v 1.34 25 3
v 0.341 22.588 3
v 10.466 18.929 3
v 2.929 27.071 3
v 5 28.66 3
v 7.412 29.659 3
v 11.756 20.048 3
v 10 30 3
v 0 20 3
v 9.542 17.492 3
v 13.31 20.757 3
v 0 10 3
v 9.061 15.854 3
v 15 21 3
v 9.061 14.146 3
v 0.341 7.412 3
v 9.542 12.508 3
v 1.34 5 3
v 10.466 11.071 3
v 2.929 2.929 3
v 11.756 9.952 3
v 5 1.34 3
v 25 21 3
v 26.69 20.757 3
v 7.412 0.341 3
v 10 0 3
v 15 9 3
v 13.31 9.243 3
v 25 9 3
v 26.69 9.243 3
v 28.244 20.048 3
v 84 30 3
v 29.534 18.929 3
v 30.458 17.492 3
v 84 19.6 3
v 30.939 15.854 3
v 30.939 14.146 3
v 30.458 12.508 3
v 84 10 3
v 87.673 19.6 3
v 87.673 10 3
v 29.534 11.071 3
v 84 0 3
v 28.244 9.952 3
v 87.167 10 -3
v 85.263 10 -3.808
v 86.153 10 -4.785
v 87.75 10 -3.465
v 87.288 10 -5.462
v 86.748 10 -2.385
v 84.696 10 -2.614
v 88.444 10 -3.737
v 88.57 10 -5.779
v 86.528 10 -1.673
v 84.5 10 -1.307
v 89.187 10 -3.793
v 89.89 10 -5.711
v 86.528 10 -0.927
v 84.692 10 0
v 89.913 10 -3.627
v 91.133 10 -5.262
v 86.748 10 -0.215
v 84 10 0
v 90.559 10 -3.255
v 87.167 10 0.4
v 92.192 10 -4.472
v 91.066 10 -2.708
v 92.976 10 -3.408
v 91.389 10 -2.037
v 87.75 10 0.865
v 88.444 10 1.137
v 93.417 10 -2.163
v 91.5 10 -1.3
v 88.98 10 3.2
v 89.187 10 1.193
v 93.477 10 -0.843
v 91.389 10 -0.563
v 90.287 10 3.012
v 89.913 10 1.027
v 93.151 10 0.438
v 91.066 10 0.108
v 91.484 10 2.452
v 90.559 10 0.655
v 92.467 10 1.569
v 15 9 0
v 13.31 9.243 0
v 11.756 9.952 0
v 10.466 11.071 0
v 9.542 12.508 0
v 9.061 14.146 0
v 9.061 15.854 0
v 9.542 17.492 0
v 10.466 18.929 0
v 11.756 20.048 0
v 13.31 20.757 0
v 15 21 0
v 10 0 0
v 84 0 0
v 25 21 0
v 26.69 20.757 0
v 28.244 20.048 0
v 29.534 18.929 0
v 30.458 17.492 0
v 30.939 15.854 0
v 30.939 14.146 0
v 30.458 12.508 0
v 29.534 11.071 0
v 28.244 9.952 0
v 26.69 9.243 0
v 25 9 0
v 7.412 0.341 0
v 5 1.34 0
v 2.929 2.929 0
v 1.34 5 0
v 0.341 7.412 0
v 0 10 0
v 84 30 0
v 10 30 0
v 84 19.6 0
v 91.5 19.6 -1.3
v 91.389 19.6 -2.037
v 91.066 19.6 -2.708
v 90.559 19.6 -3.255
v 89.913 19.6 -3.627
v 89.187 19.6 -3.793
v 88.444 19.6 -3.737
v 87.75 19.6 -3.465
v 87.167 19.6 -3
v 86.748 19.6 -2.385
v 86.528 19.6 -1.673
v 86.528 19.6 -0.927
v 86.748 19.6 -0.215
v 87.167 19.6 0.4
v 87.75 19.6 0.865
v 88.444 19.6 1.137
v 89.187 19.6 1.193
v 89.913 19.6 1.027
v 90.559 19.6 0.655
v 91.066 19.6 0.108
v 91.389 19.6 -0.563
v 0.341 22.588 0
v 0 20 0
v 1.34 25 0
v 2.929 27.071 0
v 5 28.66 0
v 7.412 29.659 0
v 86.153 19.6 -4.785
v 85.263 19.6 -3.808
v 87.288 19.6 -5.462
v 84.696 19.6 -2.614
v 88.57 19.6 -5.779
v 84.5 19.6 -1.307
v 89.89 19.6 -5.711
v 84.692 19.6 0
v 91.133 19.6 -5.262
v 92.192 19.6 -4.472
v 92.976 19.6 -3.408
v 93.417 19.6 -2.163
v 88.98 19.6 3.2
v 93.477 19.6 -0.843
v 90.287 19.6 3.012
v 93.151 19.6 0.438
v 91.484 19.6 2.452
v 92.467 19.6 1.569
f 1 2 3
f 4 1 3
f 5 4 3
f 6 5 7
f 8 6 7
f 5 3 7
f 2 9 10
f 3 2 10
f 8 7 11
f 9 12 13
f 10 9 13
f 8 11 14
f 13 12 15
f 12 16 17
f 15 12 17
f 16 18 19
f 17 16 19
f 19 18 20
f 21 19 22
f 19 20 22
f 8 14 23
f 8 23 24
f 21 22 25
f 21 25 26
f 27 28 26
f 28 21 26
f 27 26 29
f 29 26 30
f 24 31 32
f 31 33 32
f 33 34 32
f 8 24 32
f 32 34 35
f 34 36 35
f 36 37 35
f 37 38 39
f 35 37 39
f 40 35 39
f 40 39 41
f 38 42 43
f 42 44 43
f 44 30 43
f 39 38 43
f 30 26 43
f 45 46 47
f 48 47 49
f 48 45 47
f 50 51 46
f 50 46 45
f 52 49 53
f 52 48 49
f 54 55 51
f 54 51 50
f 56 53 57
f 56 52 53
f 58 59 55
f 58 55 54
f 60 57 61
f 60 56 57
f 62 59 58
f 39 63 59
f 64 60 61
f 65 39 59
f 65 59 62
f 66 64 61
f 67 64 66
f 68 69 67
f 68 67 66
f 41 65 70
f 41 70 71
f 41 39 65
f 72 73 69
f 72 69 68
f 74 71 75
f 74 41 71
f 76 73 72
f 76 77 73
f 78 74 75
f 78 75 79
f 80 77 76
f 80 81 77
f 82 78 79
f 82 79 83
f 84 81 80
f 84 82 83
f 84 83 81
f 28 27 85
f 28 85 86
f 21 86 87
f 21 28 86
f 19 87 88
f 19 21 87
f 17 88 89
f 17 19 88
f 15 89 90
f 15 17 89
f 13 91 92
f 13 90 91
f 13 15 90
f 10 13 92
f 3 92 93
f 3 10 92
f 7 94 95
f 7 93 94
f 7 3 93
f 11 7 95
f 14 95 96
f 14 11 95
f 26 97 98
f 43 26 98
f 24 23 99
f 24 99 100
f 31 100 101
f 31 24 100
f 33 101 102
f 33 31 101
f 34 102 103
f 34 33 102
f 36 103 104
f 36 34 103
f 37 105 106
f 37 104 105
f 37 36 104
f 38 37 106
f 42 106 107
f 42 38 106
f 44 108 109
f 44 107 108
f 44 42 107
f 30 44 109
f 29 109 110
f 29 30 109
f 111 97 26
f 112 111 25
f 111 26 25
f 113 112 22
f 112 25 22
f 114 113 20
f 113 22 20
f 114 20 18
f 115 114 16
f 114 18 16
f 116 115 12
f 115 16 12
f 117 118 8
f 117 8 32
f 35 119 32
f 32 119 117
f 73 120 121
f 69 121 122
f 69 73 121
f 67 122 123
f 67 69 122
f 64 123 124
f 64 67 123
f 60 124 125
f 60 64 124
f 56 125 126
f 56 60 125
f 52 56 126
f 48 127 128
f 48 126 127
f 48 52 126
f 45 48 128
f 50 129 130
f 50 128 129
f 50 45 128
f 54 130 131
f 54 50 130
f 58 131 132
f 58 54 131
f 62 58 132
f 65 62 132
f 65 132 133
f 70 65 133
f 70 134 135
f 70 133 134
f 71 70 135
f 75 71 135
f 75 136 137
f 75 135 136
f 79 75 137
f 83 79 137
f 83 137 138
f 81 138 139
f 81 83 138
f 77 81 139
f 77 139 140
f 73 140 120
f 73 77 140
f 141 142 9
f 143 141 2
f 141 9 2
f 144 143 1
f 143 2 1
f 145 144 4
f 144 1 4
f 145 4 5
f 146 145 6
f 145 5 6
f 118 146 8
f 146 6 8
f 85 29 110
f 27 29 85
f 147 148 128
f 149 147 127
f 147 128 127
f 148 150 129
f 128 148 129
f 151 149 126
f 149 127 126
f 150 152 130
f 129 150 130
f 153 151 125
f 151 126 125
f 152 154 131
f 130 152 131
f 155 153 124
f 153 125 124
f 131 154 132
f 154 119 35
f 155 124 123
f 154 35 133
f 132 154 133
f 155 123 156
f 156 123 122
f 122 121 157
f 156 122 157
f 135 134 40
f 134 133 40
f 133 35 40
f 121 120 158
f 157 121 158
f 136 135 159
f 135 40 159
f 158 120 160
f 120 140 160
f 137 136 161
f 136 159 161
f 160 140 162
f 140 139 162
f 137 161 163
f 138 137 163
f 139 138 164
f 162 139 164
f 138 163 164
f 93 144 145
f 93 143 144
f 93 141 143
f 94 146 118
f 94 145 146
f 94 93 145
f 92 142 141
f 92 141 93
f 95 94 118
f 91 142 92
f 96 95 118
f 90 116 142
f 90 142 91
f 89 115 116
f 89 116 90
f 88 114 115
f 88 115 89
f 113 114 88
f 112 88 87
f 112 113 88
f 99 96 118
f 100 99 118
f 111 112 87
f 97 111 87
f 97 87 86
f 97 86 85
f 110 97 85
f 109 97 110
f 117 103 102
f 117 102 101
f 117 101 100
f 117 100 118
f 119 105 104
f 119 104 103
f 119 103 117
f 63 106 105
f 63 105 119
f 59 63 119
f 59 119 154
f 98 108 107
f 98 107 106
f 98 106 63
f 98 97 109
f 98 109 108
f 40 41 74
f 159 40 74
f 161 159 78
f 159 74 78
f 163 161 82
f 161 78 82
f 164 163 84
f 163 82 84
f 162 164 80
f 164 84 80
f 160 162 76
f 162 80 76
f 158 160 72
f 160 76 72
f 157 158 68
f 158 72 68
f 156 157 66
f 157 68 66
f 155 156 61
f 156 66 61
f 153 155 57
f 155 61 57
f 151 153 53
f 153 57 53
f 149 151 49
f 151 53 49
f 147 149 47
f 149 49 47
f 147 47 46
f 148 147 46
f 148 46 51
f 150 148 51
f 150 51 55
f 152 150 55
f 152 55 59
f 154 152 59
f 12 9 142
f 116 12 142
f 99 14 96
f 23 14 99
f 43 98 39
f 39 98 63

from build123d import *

# Parameters (mm, degrees)
SKETCH_1_W               = 88
SKETCH_1_H               = 3
EXTRUDE_1_DEPTH          = 30
SKETCH_2_R               = 4.5
EXTRUDE_1_2_DEPTH        = 30
SKETCH_3_R               = 2.5
CUT_EXTRUDE_1_DEPTH      = 31
SKETCH_4_W               = 11
SKETCH_4_H               = 10.4
SKETCH_4_H_2             = 10
CUT_EXTRUDE_2_DEPTH      = 4.2
CUT_EXTRUDE_2_DEPTH_BACK = 6.8
CUT_EXTRUDE_3_DEPTH      = 9.8


with BuildPart() as part:
    # Эскиз1 → Extrude 1 (new body)
    with BuildSketch(Plane(origin=(0, 0, 0), x_dir=(1, 0, 0), z_dir=(0, 1, 0))):
        with Locations((44, -1.5)):
            Rectangle(SKETCH_1_W, SKETCH_1_H)
    extrude(amount=EXTRUDE_1_DEPTH)

    # Эскиз2 → Extrude 1 2 (add)
    with BuildSketch(Plane(origin=(0, 0, 0), x_dir=(1, 0, 0), z_dir=(0, 1, 0))):
        with Locations((89, 1.3)):
            Circle(SKETCH_2_R)
    extrude(amount=EXTRUDE_1_2_DEPTH)

    # Эскиз3 → Вырез-Вытянуть1 (cut, through all)
    with BuildSketch(Plane(origin=(0, 0, 0), x_dir=(1, 0, 0), z_dir=(0, 1, 0))):
        with Locations((89, 1.3)):
            Circle(SKETCH_3_R)
    extrude(amount=CUT_EXTRUDE_1_DEPTH, mode=Mode.SUBTRACT)

    # Эскиз4 → Вырез-Вытянуть2 (cut, two sides)
    with BuildSketch(Plane.XY) as cut_extrude_2_sk:
        with Locations((89.5, 24.8)):
            Rectangle(SKETCH_4_W, SKETCH_4_H)
        with Locations((89.5, 5)):
            Rectangle(SKETCH_4_W, SKETCH_4_H_2)
    extrude(amount=CUT_EXTRUDE_2_DEPTH, mode=Mode.SUBTRACT)
    extrude(cut_extrude_2_sk.sketch, amount=-CUT_EXTRUDE_2_DEPTH_BACK, mode=Mode.SUBTRACT)

    # Эскиз5 → Вырез-Вытянуть3 (cut, through all)
    with BuildSketch(Plane.XY.offset(3)):
        with BuildLine():
            Line((15, 21), (25, 21))
            ThreePointArc((25, 21), (31, 15), (25, 9))
            Line((25, 9), (15, 9))
            ThreePointArc((15, 9), (9, 15), (15, 21))
        make_face()
        with BuildLine():
            Line((10, 30), (0, 30))
            Line((0, 30), (0, 20))
            ThreePointArc((0, 20), (2.928932188, 27.071067812), (10, 30))
        make_face()
        with BuildLine():
            Line((0, 10), (0, 0))
            Line((0, 0), (10, 0))
            ThreePointArc((10, 0), (2.928932188, 2.928932188), (0, 10))
        make_face()
    extrude(amount=-CUT_EXTRUDE_3_DEPTH, mode=Mode.SUBTRACT)


solid = part.part
